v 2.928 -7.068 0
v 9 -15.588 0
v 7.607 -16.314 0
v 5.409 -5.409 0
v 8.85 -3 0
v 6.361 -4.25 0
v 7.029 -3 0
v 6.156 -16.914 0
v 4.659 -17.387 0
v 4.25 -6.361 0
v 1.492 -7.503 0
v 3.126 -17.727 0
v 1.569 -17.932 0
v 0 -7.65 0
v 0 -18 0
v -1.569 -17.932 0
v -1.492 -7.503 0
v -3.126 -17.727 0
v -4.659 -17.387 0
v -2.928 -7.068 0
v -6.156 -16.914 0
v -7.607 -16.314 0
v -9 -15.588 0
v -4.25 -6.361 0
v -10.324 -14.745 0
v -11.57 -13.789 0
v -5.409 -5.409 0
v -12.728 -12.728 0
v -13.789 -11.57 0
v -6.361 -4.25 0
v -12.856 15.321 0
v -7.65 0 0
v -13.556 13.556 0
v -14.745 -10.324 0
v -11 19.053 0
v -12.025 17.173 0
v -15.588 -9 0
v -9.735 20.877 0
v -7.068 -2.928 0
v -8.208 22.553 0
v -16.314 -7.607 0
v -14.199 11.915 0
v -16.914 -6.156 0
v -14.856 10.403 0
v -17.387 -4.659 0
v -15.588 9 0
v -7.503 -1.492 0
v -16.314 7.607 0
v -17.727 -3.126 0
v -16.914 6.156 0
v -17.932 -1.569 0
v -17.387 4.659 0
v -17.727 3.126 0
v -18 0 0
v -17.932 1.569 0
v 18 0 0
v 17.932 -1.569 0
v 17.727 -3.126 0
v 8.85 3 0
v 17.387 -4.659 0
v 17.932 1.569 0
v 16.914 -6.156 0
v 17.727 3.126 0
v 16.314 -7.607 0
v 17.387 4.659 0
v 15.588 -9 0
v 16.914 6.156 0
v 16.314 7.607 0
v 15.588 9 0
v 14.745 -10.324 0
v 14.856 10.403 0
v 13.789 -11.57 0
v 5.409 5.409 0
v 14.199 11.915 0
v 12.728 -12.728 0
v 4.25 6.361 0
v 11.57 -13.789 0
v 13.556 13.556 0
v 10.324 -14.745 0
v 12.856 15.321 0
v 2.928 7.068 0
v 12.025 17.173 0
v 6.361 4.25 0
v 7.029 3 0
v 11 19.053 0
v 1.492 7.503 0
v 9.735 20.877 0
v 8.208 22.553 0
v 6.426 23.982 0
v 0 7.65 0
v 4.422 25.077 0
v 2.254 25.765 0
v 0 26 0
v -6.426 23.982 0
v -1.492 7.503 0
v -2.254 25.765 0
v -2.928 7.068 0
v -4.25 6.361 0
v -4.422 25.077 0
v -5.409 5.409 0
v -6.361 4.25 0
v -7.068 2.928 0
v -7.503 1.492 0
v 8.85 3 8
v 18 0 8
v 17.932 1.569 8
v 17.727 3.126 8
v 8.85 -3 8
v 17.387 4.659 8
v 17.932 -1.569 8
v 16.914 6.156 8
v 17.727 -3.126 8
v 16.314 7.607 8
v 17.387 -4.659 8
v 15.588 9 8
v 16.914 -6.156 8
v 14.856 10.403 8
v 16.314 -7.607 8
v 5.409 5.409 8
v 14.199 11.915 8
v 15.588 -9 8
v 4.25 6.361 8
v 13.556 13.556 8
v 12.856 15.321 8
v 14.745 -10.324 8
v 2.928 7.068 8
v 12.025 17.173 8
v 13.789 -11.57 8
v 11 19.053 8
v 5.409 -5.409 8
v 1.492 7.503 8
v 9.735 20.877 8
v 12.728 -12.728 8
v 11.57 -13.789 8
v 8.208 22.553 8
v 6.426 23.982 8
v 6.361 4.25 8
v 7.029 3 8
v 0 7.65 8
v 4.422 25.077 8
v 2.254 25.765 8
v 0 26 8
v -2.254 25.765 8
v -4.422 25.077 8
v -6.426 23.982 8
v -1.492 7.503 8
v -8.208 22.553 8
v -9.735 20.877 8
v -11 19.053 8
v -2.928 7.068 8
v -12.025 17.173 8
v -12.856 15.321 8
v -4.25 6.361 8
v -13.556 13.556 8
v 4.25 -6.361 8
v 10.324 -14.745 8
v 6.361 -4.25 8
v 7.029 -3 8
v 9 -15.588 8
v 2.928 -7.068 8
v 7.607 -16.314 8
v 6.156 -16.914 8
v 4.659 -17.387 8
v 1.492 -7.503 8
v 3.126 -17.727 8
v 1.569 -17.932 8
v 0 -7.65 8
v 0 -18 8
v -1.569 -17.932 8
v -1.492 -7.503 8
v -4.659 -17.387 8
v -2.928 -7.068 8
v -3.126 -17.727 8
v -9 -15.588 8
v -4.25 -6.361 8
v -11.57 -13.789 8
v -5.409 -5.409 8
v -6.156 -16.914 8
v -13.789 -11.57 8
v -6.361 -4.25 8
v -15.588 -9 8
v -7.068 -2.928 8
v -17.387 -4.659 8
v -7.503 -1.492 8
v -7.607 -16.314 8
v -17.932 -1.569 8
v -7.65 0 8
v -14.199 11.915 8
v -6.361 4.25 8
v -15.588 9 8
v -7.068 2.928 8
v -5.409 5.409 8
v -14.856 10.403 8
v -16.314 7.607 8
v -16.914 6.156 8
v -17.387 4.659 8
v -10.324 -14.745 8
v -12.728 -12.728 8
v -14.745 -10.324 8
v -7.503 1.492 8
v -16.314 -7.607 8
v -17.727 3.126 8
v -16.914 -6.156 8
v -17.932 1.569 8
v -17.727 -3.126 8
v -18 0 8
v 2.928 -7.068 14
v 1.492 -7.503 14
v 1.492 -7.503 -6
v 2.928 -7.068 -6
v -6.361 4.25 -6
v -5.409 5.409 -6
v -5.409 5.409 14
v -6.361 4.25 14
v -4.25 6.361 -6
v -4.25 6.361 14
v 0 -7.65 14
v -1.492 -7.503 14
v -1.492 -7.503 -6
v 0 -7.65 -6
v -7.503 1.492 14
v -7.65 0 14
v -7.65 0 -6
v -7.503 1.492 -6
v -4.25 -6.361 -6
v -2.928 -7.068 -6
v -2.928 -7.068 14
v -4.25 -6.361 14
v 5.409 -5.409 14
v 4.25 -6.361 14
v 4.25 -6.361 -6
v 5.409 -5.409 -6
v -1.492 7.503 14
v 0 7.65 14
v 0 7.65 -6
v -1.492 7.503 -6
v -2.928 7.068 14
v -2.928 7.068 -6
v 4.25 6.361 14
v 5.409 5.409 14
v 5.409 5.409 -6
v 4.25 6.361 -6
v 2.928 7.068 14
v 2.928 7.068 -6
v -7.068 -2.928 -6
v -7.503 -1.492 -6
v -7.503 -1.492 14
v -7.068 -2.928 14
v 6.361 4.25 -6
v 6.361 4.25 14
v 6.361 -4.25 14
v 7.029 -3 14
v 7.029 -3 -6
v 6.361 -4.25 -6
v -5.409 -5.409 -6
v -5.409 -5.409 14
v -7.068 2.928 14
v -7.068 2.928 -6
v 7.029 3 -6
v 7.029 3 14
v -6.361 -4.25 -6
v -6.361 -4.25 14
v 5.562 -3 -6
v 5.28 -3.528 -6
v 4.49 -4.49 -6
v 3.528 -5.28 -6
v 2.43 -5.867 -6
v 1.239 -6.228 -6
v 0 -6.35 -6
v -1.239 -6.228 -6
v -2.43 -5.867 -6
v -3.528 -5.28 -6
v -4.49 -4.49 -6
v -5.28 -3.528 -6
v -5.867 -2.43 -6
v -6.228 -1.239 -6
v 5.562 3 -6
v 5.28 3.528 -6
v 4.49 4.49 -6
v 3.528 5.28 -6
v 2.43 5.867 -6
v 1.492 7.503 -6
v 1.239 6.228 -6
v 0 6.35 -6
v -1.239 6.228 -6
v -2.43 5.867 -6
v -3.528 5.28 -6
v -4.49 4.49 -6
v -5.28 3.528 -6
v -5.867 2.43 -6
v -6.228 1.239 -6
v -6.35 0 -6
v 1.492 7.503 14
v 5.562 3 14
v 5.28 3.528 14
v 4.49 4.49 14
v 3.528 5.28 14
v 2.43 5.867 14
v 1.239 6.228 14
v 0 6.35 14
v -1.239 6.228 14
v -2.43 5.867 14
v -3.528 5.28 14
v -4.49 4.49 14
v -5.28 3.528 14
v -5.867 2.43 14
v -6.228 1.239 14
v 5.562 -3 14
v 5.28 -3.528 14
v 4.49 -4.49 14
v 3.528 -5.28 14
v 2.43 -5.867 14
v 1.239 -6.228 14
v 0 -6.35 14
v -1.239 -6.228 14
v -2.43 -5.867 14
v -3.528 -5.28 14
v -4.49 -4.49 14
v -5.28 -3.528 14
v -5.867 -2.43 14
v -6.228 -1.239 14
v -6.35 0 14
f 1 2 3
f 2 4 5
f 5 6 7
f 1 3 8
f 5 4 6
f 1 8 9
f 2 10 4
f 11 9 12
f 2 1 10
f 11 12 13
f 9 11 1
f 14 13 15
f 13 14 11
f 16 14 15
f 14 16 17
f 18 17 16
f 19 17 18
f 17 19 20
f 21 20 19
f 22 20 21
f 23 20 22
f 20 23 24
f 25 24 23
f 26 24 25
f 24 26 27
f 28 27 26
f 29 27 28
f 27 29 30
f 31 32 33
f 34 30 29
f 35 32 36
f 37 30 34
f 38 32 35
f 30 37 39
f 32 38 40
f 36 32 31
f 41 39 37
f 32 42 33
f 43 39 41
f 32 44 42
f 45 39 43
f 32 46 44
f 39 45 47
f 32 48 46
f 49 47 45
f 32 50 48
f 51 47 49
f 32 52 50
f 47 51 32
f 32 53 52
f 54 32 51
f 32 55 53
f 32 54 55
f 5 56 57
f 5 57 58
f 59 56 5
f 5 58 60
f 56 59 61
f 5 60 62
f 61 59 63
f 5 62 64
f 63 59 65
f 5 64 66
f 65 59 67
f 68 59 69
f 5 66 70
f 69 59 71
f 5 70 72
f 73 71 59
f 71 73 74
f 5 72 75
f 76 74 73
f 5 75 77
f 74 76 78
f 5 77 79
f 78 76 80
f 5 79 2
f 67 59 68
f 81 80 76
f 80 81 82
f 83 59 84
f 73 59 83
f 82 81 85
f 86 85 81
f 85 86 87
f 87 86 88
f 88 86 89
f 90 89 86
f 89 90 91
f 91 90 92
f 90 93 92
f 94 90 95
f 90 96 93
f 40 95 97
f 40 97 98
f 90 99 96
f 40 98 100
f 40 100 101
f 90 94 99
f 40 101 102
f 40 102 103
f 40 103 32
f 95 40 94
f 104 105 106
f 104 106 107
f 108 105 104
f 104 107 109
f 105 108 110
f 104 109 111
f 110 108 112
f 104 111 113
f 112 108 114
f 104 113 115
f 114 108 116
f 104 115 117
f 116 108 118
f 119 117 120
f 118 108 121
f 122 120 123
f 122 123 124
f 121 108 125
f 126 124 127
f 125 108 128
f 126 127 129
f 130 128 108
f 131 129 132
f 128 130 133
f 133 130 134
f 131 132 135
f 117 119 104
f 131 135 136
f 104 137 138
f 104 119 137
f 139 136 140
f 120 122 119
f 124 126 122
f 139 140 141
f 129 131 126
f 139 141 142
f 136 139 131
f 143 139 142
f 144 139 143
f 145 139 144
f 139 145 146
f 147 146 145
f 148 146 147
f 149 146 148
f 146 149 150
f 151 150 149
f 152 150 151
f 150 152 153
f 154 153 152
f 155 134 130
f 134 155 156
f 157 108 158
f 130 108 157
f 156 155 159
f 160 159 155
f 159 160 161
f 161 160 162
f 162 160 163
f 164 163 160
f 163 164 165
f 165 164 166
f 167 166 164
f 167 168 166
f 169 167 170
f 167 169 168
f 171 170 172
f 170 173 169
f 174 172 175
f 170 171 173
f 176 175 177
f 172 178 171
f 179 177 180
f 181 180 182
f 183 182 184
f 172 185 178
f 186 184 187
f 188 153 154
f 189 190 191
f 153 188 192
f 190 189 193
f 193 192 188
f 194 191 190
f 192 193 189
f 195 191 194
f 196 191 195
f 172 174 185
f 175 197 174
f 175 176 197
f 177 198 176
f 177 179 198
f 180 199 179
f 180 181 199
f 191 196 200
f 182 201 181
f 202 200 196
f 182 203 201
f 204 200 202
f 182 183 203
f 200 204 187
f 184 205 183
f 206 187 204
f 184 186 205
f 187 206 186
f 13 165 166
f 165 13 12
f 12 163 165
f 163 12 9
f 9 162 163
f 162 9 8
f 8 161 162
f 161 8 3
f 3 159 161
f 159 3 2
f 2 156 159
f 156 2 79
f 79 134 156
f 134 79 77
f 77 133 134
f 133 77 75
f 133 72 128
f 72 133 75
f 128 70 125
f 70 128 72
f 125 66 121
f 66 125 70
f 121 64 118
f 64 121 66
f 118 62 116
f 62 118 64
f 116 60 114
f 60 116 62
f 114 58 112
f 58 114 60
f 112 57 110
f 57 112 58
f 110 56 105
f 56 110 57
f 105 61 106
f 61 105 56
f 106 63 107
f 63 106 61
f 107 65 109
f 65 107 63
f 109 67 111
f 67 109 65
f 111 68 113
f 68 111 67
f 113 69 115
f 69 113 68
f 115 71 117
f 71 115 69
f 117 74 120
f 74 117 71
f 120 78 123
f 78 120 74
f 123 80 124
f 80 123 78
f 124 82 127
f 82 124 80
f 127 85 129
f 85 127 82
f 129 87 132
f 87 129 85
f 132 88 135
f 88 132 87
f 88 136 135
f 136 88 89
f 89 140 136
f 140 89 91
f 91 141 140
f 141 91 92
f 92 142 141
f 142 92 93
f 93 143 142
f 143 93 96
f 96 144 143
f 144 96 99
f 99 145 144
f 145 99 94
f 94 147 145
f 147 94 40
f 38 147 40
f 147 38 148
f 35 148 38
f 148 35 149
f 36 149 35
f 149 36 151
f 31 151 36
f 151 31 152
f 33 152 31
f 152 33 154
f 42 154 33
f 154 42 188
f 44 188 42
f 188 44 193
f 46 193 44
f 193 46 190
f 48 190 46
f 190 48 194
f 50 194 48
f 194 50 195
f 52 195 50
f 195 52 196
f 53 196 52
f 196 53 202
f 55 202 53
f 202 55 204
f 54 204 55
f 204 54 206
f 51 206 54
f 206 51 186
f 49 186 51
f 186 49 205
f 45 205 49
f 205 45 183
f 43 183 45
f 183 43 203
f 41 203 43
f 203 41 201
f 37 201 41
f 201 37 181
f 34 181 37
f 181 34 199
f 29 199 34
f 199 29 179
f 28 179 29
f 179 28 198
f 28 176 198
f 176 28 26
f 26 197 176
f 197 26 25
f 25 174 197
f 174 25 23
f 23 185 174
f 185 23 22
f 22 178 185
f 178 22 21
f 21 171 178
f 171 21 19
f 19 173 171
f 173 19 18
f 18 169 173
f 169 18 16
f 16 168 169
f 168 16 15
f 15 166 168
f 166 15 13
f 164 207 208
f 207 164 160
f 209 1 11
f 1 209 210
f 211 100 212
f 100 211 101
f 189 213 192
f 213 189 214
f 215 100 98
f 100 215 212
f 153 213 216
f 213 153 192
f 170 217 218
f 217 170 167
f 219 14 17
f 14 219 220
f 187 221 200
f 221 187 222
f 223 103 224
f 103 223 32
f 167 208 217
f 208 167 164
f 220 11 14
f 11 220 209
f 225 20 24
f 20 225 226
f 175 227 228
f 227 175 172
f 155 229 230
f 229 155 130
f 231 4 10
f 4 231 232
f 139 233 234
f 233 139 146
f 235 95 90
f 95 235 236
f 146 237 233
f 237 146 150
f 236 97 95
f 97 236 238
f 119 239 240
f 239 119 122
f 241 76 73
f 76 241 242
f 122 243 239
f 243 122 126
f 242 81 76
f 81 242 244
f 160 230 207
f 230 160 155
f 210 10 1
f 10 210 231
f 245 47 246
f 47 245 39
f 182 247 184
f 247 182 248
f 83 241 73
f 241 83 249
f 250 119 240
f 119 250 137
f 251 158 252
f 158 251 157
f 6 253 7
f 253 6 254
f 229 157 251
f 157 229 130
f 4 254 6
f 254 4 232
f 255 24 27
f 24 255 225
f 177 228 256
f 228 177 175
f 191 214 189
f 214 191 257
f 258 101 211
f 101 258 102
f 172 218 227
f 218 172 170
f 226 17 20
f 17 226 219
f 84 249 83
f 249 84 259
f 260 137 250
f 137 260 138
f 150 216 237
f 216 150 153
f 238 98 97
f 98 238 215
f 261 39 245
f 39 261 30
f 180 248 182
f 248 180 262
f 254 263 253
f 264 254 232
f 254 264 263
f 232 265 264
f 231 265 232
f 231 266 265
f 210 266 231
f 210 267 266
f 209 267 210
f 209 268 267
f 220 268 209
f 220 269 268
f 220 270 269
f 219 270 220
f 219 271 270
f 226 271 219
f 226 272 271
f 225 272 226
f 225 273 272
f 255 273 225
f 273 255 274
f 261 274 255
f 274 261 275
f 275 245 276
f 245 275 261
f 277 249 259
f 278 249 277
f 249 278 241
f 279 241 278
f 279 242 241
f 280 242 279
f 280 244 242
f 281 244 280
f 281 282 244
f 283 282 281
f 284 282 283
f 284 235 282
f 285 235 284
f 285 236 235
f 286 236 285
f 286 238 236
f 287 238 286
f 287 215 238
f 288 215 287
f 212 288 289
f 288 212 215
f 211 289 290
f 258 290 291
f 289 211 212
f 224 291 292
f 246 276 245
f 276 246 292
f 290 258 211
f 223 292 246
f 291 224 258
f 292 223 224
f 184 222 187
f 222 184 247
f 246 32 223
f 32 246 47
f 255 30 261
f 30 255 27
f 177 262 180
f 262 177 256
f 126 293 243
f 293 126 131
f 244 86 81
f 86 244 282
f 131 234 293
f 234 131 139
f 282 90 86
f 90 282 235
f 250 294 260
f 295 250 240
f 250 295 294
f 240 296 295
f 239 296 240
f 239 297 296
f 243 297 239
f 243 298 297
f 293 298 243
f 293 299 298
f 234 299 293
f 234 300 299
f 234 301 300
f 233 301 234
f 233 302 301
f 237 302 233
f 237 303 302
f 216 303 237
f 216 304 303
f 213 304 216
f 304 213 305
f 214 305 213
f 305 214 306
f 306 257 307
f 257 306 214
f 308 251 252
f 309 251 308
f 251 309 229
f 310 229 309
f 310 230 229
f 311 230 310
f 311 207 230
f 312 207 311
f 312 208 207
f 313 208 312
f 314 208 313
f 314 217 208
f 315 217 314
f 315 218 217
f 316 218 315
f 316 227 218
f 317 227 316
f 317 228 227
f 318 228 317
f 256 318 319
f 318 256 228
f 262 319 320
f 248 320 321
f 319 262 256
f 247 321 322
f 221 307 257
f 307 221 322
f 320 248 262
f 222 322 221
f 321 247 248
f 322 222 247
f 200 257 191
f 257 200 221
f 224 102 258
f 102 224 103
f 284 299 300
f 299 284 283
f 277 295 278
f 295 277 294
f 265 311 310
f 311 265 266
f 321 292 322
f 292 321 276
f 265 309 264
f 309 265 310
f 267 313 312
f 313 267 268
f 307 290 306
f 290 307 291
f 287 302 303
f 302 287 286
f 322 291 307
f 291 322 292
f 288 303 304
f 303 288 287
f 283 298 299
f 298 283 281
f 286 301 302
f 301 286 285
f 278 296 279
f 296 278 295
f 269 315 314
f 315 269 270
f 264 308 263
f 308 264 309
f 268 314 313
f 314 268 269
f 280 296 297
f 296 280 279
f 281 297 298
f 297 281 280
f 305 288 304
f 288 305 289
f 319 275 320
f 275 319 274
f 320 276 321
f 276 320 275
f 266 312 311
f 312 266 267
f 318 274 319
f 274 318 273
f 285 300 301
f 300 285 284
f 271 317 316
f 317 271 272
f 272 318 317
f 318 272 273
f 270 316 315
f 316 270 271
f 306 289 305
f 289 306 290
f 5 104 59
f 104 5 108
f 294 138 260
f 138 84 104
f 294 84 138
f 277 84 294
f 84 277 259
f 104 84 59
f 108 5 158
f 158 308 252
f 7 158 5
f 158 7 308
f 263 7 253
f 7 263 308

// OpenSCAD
$fn = 32;

// ----------------------------------------------------------------------
// Cam: base radius 18 mm with a 8 mm lift over 120 degrees
// ----------------------------------------------------------------------

// --- parameters (mm) ---
base_r = 18;              // base radius
lift = 8;                 // lift height above the base radius
lift_span = 120;          // angular width of the lift
lift_start = 30;          // angle where the lift starts
cam_t = 8;                // cam plate thickness
hub_d = 15.3;             // hub diameter
hub_h = 20;               // hub height
bore_d = 12.7;            // bore
key_w = 6;                // keyway width
key_depth = 1.6;          // keyway depth

cam_profile = [[18, 0], [17.932, 1.569], [17.727, 3.126], [17.387, 4.659], [16.914, 6.156], [16.314, 7.607], [15.588, 9], [14.856, 10.403], [14.199, 11.915], [13.556, 13.556], [12.856, 15.321], [12.025, 17.173], [11, 19.053], [9.735, 20.877], [8.208, 22.553], [6.426, 23.982], [4.422, 25.077], [2.254, 25.765], [0, 26], [-2.254, 25.765], [-4.422, 25.077], [-6.426, 23.982], [-8.208, 22.553], [-9.735, 20.877], [-11, 19.053], [-12.025, 17.173], [-12.856, 15.321], [-13.556, 13.556], [-14.199, 11.915], [-14.856, 10.403], [-15.588, 9], [-16.314, 7.607], [-16.914, 6.156], [-17.387, 4.659], [-17.727, 3.126], [-17.932, 1.569], [-18, 0], [-17.932, -1.569], [-17.727, -3.126], [-17.387, -4.659], [-16.914, -6.156], [-16.314, -7.607], [-15.588, -9], [-14.745, -10.324], [-13.789, -11.57], [-12.728, -12.728], [-11.57, -13.789], [-10.324, -14.745], [-9, -15.588], [-7.607, -16.314], [-6.156, -16.914], [-4.659, -17.387], [-3.126, -17.727], [-1.569, -17.932], [0, -18], [1.569, -17.932], [3.126, -17.727], [4.659, -17.387], [6.156, -16.914], [7.607, -16.314], [9, -15.588], [10.324, -14.745], [11.57, -13.789], [12.728, -12.728], [13.789, -11.57], [14.745, -10.324], [15.588, -9], [16.314, -7.607], [16.914, -6.156], [17.387, -4.659], [17.727, -3.126], [17.932, -1.569]];

difference() {
  union() {
    linear_extrude(height = cam_t) polygon(cam_profile);
    /* hub, proud of the cam plate on both sides */
    translate([0, 0, -6]) cylinder(h = hub_h, d = hub_d);
  }
  /* bore through the hub, 2.5 mm clear on both faces */
  translate([0, 0, -8.5]) cylinder(h = hub_h + 5, d = bore_d);
  /* keyway, milled through the whole hub */
  translate([4.75, -3, -8.5]) cube([4.1, 6, 25]);
}
